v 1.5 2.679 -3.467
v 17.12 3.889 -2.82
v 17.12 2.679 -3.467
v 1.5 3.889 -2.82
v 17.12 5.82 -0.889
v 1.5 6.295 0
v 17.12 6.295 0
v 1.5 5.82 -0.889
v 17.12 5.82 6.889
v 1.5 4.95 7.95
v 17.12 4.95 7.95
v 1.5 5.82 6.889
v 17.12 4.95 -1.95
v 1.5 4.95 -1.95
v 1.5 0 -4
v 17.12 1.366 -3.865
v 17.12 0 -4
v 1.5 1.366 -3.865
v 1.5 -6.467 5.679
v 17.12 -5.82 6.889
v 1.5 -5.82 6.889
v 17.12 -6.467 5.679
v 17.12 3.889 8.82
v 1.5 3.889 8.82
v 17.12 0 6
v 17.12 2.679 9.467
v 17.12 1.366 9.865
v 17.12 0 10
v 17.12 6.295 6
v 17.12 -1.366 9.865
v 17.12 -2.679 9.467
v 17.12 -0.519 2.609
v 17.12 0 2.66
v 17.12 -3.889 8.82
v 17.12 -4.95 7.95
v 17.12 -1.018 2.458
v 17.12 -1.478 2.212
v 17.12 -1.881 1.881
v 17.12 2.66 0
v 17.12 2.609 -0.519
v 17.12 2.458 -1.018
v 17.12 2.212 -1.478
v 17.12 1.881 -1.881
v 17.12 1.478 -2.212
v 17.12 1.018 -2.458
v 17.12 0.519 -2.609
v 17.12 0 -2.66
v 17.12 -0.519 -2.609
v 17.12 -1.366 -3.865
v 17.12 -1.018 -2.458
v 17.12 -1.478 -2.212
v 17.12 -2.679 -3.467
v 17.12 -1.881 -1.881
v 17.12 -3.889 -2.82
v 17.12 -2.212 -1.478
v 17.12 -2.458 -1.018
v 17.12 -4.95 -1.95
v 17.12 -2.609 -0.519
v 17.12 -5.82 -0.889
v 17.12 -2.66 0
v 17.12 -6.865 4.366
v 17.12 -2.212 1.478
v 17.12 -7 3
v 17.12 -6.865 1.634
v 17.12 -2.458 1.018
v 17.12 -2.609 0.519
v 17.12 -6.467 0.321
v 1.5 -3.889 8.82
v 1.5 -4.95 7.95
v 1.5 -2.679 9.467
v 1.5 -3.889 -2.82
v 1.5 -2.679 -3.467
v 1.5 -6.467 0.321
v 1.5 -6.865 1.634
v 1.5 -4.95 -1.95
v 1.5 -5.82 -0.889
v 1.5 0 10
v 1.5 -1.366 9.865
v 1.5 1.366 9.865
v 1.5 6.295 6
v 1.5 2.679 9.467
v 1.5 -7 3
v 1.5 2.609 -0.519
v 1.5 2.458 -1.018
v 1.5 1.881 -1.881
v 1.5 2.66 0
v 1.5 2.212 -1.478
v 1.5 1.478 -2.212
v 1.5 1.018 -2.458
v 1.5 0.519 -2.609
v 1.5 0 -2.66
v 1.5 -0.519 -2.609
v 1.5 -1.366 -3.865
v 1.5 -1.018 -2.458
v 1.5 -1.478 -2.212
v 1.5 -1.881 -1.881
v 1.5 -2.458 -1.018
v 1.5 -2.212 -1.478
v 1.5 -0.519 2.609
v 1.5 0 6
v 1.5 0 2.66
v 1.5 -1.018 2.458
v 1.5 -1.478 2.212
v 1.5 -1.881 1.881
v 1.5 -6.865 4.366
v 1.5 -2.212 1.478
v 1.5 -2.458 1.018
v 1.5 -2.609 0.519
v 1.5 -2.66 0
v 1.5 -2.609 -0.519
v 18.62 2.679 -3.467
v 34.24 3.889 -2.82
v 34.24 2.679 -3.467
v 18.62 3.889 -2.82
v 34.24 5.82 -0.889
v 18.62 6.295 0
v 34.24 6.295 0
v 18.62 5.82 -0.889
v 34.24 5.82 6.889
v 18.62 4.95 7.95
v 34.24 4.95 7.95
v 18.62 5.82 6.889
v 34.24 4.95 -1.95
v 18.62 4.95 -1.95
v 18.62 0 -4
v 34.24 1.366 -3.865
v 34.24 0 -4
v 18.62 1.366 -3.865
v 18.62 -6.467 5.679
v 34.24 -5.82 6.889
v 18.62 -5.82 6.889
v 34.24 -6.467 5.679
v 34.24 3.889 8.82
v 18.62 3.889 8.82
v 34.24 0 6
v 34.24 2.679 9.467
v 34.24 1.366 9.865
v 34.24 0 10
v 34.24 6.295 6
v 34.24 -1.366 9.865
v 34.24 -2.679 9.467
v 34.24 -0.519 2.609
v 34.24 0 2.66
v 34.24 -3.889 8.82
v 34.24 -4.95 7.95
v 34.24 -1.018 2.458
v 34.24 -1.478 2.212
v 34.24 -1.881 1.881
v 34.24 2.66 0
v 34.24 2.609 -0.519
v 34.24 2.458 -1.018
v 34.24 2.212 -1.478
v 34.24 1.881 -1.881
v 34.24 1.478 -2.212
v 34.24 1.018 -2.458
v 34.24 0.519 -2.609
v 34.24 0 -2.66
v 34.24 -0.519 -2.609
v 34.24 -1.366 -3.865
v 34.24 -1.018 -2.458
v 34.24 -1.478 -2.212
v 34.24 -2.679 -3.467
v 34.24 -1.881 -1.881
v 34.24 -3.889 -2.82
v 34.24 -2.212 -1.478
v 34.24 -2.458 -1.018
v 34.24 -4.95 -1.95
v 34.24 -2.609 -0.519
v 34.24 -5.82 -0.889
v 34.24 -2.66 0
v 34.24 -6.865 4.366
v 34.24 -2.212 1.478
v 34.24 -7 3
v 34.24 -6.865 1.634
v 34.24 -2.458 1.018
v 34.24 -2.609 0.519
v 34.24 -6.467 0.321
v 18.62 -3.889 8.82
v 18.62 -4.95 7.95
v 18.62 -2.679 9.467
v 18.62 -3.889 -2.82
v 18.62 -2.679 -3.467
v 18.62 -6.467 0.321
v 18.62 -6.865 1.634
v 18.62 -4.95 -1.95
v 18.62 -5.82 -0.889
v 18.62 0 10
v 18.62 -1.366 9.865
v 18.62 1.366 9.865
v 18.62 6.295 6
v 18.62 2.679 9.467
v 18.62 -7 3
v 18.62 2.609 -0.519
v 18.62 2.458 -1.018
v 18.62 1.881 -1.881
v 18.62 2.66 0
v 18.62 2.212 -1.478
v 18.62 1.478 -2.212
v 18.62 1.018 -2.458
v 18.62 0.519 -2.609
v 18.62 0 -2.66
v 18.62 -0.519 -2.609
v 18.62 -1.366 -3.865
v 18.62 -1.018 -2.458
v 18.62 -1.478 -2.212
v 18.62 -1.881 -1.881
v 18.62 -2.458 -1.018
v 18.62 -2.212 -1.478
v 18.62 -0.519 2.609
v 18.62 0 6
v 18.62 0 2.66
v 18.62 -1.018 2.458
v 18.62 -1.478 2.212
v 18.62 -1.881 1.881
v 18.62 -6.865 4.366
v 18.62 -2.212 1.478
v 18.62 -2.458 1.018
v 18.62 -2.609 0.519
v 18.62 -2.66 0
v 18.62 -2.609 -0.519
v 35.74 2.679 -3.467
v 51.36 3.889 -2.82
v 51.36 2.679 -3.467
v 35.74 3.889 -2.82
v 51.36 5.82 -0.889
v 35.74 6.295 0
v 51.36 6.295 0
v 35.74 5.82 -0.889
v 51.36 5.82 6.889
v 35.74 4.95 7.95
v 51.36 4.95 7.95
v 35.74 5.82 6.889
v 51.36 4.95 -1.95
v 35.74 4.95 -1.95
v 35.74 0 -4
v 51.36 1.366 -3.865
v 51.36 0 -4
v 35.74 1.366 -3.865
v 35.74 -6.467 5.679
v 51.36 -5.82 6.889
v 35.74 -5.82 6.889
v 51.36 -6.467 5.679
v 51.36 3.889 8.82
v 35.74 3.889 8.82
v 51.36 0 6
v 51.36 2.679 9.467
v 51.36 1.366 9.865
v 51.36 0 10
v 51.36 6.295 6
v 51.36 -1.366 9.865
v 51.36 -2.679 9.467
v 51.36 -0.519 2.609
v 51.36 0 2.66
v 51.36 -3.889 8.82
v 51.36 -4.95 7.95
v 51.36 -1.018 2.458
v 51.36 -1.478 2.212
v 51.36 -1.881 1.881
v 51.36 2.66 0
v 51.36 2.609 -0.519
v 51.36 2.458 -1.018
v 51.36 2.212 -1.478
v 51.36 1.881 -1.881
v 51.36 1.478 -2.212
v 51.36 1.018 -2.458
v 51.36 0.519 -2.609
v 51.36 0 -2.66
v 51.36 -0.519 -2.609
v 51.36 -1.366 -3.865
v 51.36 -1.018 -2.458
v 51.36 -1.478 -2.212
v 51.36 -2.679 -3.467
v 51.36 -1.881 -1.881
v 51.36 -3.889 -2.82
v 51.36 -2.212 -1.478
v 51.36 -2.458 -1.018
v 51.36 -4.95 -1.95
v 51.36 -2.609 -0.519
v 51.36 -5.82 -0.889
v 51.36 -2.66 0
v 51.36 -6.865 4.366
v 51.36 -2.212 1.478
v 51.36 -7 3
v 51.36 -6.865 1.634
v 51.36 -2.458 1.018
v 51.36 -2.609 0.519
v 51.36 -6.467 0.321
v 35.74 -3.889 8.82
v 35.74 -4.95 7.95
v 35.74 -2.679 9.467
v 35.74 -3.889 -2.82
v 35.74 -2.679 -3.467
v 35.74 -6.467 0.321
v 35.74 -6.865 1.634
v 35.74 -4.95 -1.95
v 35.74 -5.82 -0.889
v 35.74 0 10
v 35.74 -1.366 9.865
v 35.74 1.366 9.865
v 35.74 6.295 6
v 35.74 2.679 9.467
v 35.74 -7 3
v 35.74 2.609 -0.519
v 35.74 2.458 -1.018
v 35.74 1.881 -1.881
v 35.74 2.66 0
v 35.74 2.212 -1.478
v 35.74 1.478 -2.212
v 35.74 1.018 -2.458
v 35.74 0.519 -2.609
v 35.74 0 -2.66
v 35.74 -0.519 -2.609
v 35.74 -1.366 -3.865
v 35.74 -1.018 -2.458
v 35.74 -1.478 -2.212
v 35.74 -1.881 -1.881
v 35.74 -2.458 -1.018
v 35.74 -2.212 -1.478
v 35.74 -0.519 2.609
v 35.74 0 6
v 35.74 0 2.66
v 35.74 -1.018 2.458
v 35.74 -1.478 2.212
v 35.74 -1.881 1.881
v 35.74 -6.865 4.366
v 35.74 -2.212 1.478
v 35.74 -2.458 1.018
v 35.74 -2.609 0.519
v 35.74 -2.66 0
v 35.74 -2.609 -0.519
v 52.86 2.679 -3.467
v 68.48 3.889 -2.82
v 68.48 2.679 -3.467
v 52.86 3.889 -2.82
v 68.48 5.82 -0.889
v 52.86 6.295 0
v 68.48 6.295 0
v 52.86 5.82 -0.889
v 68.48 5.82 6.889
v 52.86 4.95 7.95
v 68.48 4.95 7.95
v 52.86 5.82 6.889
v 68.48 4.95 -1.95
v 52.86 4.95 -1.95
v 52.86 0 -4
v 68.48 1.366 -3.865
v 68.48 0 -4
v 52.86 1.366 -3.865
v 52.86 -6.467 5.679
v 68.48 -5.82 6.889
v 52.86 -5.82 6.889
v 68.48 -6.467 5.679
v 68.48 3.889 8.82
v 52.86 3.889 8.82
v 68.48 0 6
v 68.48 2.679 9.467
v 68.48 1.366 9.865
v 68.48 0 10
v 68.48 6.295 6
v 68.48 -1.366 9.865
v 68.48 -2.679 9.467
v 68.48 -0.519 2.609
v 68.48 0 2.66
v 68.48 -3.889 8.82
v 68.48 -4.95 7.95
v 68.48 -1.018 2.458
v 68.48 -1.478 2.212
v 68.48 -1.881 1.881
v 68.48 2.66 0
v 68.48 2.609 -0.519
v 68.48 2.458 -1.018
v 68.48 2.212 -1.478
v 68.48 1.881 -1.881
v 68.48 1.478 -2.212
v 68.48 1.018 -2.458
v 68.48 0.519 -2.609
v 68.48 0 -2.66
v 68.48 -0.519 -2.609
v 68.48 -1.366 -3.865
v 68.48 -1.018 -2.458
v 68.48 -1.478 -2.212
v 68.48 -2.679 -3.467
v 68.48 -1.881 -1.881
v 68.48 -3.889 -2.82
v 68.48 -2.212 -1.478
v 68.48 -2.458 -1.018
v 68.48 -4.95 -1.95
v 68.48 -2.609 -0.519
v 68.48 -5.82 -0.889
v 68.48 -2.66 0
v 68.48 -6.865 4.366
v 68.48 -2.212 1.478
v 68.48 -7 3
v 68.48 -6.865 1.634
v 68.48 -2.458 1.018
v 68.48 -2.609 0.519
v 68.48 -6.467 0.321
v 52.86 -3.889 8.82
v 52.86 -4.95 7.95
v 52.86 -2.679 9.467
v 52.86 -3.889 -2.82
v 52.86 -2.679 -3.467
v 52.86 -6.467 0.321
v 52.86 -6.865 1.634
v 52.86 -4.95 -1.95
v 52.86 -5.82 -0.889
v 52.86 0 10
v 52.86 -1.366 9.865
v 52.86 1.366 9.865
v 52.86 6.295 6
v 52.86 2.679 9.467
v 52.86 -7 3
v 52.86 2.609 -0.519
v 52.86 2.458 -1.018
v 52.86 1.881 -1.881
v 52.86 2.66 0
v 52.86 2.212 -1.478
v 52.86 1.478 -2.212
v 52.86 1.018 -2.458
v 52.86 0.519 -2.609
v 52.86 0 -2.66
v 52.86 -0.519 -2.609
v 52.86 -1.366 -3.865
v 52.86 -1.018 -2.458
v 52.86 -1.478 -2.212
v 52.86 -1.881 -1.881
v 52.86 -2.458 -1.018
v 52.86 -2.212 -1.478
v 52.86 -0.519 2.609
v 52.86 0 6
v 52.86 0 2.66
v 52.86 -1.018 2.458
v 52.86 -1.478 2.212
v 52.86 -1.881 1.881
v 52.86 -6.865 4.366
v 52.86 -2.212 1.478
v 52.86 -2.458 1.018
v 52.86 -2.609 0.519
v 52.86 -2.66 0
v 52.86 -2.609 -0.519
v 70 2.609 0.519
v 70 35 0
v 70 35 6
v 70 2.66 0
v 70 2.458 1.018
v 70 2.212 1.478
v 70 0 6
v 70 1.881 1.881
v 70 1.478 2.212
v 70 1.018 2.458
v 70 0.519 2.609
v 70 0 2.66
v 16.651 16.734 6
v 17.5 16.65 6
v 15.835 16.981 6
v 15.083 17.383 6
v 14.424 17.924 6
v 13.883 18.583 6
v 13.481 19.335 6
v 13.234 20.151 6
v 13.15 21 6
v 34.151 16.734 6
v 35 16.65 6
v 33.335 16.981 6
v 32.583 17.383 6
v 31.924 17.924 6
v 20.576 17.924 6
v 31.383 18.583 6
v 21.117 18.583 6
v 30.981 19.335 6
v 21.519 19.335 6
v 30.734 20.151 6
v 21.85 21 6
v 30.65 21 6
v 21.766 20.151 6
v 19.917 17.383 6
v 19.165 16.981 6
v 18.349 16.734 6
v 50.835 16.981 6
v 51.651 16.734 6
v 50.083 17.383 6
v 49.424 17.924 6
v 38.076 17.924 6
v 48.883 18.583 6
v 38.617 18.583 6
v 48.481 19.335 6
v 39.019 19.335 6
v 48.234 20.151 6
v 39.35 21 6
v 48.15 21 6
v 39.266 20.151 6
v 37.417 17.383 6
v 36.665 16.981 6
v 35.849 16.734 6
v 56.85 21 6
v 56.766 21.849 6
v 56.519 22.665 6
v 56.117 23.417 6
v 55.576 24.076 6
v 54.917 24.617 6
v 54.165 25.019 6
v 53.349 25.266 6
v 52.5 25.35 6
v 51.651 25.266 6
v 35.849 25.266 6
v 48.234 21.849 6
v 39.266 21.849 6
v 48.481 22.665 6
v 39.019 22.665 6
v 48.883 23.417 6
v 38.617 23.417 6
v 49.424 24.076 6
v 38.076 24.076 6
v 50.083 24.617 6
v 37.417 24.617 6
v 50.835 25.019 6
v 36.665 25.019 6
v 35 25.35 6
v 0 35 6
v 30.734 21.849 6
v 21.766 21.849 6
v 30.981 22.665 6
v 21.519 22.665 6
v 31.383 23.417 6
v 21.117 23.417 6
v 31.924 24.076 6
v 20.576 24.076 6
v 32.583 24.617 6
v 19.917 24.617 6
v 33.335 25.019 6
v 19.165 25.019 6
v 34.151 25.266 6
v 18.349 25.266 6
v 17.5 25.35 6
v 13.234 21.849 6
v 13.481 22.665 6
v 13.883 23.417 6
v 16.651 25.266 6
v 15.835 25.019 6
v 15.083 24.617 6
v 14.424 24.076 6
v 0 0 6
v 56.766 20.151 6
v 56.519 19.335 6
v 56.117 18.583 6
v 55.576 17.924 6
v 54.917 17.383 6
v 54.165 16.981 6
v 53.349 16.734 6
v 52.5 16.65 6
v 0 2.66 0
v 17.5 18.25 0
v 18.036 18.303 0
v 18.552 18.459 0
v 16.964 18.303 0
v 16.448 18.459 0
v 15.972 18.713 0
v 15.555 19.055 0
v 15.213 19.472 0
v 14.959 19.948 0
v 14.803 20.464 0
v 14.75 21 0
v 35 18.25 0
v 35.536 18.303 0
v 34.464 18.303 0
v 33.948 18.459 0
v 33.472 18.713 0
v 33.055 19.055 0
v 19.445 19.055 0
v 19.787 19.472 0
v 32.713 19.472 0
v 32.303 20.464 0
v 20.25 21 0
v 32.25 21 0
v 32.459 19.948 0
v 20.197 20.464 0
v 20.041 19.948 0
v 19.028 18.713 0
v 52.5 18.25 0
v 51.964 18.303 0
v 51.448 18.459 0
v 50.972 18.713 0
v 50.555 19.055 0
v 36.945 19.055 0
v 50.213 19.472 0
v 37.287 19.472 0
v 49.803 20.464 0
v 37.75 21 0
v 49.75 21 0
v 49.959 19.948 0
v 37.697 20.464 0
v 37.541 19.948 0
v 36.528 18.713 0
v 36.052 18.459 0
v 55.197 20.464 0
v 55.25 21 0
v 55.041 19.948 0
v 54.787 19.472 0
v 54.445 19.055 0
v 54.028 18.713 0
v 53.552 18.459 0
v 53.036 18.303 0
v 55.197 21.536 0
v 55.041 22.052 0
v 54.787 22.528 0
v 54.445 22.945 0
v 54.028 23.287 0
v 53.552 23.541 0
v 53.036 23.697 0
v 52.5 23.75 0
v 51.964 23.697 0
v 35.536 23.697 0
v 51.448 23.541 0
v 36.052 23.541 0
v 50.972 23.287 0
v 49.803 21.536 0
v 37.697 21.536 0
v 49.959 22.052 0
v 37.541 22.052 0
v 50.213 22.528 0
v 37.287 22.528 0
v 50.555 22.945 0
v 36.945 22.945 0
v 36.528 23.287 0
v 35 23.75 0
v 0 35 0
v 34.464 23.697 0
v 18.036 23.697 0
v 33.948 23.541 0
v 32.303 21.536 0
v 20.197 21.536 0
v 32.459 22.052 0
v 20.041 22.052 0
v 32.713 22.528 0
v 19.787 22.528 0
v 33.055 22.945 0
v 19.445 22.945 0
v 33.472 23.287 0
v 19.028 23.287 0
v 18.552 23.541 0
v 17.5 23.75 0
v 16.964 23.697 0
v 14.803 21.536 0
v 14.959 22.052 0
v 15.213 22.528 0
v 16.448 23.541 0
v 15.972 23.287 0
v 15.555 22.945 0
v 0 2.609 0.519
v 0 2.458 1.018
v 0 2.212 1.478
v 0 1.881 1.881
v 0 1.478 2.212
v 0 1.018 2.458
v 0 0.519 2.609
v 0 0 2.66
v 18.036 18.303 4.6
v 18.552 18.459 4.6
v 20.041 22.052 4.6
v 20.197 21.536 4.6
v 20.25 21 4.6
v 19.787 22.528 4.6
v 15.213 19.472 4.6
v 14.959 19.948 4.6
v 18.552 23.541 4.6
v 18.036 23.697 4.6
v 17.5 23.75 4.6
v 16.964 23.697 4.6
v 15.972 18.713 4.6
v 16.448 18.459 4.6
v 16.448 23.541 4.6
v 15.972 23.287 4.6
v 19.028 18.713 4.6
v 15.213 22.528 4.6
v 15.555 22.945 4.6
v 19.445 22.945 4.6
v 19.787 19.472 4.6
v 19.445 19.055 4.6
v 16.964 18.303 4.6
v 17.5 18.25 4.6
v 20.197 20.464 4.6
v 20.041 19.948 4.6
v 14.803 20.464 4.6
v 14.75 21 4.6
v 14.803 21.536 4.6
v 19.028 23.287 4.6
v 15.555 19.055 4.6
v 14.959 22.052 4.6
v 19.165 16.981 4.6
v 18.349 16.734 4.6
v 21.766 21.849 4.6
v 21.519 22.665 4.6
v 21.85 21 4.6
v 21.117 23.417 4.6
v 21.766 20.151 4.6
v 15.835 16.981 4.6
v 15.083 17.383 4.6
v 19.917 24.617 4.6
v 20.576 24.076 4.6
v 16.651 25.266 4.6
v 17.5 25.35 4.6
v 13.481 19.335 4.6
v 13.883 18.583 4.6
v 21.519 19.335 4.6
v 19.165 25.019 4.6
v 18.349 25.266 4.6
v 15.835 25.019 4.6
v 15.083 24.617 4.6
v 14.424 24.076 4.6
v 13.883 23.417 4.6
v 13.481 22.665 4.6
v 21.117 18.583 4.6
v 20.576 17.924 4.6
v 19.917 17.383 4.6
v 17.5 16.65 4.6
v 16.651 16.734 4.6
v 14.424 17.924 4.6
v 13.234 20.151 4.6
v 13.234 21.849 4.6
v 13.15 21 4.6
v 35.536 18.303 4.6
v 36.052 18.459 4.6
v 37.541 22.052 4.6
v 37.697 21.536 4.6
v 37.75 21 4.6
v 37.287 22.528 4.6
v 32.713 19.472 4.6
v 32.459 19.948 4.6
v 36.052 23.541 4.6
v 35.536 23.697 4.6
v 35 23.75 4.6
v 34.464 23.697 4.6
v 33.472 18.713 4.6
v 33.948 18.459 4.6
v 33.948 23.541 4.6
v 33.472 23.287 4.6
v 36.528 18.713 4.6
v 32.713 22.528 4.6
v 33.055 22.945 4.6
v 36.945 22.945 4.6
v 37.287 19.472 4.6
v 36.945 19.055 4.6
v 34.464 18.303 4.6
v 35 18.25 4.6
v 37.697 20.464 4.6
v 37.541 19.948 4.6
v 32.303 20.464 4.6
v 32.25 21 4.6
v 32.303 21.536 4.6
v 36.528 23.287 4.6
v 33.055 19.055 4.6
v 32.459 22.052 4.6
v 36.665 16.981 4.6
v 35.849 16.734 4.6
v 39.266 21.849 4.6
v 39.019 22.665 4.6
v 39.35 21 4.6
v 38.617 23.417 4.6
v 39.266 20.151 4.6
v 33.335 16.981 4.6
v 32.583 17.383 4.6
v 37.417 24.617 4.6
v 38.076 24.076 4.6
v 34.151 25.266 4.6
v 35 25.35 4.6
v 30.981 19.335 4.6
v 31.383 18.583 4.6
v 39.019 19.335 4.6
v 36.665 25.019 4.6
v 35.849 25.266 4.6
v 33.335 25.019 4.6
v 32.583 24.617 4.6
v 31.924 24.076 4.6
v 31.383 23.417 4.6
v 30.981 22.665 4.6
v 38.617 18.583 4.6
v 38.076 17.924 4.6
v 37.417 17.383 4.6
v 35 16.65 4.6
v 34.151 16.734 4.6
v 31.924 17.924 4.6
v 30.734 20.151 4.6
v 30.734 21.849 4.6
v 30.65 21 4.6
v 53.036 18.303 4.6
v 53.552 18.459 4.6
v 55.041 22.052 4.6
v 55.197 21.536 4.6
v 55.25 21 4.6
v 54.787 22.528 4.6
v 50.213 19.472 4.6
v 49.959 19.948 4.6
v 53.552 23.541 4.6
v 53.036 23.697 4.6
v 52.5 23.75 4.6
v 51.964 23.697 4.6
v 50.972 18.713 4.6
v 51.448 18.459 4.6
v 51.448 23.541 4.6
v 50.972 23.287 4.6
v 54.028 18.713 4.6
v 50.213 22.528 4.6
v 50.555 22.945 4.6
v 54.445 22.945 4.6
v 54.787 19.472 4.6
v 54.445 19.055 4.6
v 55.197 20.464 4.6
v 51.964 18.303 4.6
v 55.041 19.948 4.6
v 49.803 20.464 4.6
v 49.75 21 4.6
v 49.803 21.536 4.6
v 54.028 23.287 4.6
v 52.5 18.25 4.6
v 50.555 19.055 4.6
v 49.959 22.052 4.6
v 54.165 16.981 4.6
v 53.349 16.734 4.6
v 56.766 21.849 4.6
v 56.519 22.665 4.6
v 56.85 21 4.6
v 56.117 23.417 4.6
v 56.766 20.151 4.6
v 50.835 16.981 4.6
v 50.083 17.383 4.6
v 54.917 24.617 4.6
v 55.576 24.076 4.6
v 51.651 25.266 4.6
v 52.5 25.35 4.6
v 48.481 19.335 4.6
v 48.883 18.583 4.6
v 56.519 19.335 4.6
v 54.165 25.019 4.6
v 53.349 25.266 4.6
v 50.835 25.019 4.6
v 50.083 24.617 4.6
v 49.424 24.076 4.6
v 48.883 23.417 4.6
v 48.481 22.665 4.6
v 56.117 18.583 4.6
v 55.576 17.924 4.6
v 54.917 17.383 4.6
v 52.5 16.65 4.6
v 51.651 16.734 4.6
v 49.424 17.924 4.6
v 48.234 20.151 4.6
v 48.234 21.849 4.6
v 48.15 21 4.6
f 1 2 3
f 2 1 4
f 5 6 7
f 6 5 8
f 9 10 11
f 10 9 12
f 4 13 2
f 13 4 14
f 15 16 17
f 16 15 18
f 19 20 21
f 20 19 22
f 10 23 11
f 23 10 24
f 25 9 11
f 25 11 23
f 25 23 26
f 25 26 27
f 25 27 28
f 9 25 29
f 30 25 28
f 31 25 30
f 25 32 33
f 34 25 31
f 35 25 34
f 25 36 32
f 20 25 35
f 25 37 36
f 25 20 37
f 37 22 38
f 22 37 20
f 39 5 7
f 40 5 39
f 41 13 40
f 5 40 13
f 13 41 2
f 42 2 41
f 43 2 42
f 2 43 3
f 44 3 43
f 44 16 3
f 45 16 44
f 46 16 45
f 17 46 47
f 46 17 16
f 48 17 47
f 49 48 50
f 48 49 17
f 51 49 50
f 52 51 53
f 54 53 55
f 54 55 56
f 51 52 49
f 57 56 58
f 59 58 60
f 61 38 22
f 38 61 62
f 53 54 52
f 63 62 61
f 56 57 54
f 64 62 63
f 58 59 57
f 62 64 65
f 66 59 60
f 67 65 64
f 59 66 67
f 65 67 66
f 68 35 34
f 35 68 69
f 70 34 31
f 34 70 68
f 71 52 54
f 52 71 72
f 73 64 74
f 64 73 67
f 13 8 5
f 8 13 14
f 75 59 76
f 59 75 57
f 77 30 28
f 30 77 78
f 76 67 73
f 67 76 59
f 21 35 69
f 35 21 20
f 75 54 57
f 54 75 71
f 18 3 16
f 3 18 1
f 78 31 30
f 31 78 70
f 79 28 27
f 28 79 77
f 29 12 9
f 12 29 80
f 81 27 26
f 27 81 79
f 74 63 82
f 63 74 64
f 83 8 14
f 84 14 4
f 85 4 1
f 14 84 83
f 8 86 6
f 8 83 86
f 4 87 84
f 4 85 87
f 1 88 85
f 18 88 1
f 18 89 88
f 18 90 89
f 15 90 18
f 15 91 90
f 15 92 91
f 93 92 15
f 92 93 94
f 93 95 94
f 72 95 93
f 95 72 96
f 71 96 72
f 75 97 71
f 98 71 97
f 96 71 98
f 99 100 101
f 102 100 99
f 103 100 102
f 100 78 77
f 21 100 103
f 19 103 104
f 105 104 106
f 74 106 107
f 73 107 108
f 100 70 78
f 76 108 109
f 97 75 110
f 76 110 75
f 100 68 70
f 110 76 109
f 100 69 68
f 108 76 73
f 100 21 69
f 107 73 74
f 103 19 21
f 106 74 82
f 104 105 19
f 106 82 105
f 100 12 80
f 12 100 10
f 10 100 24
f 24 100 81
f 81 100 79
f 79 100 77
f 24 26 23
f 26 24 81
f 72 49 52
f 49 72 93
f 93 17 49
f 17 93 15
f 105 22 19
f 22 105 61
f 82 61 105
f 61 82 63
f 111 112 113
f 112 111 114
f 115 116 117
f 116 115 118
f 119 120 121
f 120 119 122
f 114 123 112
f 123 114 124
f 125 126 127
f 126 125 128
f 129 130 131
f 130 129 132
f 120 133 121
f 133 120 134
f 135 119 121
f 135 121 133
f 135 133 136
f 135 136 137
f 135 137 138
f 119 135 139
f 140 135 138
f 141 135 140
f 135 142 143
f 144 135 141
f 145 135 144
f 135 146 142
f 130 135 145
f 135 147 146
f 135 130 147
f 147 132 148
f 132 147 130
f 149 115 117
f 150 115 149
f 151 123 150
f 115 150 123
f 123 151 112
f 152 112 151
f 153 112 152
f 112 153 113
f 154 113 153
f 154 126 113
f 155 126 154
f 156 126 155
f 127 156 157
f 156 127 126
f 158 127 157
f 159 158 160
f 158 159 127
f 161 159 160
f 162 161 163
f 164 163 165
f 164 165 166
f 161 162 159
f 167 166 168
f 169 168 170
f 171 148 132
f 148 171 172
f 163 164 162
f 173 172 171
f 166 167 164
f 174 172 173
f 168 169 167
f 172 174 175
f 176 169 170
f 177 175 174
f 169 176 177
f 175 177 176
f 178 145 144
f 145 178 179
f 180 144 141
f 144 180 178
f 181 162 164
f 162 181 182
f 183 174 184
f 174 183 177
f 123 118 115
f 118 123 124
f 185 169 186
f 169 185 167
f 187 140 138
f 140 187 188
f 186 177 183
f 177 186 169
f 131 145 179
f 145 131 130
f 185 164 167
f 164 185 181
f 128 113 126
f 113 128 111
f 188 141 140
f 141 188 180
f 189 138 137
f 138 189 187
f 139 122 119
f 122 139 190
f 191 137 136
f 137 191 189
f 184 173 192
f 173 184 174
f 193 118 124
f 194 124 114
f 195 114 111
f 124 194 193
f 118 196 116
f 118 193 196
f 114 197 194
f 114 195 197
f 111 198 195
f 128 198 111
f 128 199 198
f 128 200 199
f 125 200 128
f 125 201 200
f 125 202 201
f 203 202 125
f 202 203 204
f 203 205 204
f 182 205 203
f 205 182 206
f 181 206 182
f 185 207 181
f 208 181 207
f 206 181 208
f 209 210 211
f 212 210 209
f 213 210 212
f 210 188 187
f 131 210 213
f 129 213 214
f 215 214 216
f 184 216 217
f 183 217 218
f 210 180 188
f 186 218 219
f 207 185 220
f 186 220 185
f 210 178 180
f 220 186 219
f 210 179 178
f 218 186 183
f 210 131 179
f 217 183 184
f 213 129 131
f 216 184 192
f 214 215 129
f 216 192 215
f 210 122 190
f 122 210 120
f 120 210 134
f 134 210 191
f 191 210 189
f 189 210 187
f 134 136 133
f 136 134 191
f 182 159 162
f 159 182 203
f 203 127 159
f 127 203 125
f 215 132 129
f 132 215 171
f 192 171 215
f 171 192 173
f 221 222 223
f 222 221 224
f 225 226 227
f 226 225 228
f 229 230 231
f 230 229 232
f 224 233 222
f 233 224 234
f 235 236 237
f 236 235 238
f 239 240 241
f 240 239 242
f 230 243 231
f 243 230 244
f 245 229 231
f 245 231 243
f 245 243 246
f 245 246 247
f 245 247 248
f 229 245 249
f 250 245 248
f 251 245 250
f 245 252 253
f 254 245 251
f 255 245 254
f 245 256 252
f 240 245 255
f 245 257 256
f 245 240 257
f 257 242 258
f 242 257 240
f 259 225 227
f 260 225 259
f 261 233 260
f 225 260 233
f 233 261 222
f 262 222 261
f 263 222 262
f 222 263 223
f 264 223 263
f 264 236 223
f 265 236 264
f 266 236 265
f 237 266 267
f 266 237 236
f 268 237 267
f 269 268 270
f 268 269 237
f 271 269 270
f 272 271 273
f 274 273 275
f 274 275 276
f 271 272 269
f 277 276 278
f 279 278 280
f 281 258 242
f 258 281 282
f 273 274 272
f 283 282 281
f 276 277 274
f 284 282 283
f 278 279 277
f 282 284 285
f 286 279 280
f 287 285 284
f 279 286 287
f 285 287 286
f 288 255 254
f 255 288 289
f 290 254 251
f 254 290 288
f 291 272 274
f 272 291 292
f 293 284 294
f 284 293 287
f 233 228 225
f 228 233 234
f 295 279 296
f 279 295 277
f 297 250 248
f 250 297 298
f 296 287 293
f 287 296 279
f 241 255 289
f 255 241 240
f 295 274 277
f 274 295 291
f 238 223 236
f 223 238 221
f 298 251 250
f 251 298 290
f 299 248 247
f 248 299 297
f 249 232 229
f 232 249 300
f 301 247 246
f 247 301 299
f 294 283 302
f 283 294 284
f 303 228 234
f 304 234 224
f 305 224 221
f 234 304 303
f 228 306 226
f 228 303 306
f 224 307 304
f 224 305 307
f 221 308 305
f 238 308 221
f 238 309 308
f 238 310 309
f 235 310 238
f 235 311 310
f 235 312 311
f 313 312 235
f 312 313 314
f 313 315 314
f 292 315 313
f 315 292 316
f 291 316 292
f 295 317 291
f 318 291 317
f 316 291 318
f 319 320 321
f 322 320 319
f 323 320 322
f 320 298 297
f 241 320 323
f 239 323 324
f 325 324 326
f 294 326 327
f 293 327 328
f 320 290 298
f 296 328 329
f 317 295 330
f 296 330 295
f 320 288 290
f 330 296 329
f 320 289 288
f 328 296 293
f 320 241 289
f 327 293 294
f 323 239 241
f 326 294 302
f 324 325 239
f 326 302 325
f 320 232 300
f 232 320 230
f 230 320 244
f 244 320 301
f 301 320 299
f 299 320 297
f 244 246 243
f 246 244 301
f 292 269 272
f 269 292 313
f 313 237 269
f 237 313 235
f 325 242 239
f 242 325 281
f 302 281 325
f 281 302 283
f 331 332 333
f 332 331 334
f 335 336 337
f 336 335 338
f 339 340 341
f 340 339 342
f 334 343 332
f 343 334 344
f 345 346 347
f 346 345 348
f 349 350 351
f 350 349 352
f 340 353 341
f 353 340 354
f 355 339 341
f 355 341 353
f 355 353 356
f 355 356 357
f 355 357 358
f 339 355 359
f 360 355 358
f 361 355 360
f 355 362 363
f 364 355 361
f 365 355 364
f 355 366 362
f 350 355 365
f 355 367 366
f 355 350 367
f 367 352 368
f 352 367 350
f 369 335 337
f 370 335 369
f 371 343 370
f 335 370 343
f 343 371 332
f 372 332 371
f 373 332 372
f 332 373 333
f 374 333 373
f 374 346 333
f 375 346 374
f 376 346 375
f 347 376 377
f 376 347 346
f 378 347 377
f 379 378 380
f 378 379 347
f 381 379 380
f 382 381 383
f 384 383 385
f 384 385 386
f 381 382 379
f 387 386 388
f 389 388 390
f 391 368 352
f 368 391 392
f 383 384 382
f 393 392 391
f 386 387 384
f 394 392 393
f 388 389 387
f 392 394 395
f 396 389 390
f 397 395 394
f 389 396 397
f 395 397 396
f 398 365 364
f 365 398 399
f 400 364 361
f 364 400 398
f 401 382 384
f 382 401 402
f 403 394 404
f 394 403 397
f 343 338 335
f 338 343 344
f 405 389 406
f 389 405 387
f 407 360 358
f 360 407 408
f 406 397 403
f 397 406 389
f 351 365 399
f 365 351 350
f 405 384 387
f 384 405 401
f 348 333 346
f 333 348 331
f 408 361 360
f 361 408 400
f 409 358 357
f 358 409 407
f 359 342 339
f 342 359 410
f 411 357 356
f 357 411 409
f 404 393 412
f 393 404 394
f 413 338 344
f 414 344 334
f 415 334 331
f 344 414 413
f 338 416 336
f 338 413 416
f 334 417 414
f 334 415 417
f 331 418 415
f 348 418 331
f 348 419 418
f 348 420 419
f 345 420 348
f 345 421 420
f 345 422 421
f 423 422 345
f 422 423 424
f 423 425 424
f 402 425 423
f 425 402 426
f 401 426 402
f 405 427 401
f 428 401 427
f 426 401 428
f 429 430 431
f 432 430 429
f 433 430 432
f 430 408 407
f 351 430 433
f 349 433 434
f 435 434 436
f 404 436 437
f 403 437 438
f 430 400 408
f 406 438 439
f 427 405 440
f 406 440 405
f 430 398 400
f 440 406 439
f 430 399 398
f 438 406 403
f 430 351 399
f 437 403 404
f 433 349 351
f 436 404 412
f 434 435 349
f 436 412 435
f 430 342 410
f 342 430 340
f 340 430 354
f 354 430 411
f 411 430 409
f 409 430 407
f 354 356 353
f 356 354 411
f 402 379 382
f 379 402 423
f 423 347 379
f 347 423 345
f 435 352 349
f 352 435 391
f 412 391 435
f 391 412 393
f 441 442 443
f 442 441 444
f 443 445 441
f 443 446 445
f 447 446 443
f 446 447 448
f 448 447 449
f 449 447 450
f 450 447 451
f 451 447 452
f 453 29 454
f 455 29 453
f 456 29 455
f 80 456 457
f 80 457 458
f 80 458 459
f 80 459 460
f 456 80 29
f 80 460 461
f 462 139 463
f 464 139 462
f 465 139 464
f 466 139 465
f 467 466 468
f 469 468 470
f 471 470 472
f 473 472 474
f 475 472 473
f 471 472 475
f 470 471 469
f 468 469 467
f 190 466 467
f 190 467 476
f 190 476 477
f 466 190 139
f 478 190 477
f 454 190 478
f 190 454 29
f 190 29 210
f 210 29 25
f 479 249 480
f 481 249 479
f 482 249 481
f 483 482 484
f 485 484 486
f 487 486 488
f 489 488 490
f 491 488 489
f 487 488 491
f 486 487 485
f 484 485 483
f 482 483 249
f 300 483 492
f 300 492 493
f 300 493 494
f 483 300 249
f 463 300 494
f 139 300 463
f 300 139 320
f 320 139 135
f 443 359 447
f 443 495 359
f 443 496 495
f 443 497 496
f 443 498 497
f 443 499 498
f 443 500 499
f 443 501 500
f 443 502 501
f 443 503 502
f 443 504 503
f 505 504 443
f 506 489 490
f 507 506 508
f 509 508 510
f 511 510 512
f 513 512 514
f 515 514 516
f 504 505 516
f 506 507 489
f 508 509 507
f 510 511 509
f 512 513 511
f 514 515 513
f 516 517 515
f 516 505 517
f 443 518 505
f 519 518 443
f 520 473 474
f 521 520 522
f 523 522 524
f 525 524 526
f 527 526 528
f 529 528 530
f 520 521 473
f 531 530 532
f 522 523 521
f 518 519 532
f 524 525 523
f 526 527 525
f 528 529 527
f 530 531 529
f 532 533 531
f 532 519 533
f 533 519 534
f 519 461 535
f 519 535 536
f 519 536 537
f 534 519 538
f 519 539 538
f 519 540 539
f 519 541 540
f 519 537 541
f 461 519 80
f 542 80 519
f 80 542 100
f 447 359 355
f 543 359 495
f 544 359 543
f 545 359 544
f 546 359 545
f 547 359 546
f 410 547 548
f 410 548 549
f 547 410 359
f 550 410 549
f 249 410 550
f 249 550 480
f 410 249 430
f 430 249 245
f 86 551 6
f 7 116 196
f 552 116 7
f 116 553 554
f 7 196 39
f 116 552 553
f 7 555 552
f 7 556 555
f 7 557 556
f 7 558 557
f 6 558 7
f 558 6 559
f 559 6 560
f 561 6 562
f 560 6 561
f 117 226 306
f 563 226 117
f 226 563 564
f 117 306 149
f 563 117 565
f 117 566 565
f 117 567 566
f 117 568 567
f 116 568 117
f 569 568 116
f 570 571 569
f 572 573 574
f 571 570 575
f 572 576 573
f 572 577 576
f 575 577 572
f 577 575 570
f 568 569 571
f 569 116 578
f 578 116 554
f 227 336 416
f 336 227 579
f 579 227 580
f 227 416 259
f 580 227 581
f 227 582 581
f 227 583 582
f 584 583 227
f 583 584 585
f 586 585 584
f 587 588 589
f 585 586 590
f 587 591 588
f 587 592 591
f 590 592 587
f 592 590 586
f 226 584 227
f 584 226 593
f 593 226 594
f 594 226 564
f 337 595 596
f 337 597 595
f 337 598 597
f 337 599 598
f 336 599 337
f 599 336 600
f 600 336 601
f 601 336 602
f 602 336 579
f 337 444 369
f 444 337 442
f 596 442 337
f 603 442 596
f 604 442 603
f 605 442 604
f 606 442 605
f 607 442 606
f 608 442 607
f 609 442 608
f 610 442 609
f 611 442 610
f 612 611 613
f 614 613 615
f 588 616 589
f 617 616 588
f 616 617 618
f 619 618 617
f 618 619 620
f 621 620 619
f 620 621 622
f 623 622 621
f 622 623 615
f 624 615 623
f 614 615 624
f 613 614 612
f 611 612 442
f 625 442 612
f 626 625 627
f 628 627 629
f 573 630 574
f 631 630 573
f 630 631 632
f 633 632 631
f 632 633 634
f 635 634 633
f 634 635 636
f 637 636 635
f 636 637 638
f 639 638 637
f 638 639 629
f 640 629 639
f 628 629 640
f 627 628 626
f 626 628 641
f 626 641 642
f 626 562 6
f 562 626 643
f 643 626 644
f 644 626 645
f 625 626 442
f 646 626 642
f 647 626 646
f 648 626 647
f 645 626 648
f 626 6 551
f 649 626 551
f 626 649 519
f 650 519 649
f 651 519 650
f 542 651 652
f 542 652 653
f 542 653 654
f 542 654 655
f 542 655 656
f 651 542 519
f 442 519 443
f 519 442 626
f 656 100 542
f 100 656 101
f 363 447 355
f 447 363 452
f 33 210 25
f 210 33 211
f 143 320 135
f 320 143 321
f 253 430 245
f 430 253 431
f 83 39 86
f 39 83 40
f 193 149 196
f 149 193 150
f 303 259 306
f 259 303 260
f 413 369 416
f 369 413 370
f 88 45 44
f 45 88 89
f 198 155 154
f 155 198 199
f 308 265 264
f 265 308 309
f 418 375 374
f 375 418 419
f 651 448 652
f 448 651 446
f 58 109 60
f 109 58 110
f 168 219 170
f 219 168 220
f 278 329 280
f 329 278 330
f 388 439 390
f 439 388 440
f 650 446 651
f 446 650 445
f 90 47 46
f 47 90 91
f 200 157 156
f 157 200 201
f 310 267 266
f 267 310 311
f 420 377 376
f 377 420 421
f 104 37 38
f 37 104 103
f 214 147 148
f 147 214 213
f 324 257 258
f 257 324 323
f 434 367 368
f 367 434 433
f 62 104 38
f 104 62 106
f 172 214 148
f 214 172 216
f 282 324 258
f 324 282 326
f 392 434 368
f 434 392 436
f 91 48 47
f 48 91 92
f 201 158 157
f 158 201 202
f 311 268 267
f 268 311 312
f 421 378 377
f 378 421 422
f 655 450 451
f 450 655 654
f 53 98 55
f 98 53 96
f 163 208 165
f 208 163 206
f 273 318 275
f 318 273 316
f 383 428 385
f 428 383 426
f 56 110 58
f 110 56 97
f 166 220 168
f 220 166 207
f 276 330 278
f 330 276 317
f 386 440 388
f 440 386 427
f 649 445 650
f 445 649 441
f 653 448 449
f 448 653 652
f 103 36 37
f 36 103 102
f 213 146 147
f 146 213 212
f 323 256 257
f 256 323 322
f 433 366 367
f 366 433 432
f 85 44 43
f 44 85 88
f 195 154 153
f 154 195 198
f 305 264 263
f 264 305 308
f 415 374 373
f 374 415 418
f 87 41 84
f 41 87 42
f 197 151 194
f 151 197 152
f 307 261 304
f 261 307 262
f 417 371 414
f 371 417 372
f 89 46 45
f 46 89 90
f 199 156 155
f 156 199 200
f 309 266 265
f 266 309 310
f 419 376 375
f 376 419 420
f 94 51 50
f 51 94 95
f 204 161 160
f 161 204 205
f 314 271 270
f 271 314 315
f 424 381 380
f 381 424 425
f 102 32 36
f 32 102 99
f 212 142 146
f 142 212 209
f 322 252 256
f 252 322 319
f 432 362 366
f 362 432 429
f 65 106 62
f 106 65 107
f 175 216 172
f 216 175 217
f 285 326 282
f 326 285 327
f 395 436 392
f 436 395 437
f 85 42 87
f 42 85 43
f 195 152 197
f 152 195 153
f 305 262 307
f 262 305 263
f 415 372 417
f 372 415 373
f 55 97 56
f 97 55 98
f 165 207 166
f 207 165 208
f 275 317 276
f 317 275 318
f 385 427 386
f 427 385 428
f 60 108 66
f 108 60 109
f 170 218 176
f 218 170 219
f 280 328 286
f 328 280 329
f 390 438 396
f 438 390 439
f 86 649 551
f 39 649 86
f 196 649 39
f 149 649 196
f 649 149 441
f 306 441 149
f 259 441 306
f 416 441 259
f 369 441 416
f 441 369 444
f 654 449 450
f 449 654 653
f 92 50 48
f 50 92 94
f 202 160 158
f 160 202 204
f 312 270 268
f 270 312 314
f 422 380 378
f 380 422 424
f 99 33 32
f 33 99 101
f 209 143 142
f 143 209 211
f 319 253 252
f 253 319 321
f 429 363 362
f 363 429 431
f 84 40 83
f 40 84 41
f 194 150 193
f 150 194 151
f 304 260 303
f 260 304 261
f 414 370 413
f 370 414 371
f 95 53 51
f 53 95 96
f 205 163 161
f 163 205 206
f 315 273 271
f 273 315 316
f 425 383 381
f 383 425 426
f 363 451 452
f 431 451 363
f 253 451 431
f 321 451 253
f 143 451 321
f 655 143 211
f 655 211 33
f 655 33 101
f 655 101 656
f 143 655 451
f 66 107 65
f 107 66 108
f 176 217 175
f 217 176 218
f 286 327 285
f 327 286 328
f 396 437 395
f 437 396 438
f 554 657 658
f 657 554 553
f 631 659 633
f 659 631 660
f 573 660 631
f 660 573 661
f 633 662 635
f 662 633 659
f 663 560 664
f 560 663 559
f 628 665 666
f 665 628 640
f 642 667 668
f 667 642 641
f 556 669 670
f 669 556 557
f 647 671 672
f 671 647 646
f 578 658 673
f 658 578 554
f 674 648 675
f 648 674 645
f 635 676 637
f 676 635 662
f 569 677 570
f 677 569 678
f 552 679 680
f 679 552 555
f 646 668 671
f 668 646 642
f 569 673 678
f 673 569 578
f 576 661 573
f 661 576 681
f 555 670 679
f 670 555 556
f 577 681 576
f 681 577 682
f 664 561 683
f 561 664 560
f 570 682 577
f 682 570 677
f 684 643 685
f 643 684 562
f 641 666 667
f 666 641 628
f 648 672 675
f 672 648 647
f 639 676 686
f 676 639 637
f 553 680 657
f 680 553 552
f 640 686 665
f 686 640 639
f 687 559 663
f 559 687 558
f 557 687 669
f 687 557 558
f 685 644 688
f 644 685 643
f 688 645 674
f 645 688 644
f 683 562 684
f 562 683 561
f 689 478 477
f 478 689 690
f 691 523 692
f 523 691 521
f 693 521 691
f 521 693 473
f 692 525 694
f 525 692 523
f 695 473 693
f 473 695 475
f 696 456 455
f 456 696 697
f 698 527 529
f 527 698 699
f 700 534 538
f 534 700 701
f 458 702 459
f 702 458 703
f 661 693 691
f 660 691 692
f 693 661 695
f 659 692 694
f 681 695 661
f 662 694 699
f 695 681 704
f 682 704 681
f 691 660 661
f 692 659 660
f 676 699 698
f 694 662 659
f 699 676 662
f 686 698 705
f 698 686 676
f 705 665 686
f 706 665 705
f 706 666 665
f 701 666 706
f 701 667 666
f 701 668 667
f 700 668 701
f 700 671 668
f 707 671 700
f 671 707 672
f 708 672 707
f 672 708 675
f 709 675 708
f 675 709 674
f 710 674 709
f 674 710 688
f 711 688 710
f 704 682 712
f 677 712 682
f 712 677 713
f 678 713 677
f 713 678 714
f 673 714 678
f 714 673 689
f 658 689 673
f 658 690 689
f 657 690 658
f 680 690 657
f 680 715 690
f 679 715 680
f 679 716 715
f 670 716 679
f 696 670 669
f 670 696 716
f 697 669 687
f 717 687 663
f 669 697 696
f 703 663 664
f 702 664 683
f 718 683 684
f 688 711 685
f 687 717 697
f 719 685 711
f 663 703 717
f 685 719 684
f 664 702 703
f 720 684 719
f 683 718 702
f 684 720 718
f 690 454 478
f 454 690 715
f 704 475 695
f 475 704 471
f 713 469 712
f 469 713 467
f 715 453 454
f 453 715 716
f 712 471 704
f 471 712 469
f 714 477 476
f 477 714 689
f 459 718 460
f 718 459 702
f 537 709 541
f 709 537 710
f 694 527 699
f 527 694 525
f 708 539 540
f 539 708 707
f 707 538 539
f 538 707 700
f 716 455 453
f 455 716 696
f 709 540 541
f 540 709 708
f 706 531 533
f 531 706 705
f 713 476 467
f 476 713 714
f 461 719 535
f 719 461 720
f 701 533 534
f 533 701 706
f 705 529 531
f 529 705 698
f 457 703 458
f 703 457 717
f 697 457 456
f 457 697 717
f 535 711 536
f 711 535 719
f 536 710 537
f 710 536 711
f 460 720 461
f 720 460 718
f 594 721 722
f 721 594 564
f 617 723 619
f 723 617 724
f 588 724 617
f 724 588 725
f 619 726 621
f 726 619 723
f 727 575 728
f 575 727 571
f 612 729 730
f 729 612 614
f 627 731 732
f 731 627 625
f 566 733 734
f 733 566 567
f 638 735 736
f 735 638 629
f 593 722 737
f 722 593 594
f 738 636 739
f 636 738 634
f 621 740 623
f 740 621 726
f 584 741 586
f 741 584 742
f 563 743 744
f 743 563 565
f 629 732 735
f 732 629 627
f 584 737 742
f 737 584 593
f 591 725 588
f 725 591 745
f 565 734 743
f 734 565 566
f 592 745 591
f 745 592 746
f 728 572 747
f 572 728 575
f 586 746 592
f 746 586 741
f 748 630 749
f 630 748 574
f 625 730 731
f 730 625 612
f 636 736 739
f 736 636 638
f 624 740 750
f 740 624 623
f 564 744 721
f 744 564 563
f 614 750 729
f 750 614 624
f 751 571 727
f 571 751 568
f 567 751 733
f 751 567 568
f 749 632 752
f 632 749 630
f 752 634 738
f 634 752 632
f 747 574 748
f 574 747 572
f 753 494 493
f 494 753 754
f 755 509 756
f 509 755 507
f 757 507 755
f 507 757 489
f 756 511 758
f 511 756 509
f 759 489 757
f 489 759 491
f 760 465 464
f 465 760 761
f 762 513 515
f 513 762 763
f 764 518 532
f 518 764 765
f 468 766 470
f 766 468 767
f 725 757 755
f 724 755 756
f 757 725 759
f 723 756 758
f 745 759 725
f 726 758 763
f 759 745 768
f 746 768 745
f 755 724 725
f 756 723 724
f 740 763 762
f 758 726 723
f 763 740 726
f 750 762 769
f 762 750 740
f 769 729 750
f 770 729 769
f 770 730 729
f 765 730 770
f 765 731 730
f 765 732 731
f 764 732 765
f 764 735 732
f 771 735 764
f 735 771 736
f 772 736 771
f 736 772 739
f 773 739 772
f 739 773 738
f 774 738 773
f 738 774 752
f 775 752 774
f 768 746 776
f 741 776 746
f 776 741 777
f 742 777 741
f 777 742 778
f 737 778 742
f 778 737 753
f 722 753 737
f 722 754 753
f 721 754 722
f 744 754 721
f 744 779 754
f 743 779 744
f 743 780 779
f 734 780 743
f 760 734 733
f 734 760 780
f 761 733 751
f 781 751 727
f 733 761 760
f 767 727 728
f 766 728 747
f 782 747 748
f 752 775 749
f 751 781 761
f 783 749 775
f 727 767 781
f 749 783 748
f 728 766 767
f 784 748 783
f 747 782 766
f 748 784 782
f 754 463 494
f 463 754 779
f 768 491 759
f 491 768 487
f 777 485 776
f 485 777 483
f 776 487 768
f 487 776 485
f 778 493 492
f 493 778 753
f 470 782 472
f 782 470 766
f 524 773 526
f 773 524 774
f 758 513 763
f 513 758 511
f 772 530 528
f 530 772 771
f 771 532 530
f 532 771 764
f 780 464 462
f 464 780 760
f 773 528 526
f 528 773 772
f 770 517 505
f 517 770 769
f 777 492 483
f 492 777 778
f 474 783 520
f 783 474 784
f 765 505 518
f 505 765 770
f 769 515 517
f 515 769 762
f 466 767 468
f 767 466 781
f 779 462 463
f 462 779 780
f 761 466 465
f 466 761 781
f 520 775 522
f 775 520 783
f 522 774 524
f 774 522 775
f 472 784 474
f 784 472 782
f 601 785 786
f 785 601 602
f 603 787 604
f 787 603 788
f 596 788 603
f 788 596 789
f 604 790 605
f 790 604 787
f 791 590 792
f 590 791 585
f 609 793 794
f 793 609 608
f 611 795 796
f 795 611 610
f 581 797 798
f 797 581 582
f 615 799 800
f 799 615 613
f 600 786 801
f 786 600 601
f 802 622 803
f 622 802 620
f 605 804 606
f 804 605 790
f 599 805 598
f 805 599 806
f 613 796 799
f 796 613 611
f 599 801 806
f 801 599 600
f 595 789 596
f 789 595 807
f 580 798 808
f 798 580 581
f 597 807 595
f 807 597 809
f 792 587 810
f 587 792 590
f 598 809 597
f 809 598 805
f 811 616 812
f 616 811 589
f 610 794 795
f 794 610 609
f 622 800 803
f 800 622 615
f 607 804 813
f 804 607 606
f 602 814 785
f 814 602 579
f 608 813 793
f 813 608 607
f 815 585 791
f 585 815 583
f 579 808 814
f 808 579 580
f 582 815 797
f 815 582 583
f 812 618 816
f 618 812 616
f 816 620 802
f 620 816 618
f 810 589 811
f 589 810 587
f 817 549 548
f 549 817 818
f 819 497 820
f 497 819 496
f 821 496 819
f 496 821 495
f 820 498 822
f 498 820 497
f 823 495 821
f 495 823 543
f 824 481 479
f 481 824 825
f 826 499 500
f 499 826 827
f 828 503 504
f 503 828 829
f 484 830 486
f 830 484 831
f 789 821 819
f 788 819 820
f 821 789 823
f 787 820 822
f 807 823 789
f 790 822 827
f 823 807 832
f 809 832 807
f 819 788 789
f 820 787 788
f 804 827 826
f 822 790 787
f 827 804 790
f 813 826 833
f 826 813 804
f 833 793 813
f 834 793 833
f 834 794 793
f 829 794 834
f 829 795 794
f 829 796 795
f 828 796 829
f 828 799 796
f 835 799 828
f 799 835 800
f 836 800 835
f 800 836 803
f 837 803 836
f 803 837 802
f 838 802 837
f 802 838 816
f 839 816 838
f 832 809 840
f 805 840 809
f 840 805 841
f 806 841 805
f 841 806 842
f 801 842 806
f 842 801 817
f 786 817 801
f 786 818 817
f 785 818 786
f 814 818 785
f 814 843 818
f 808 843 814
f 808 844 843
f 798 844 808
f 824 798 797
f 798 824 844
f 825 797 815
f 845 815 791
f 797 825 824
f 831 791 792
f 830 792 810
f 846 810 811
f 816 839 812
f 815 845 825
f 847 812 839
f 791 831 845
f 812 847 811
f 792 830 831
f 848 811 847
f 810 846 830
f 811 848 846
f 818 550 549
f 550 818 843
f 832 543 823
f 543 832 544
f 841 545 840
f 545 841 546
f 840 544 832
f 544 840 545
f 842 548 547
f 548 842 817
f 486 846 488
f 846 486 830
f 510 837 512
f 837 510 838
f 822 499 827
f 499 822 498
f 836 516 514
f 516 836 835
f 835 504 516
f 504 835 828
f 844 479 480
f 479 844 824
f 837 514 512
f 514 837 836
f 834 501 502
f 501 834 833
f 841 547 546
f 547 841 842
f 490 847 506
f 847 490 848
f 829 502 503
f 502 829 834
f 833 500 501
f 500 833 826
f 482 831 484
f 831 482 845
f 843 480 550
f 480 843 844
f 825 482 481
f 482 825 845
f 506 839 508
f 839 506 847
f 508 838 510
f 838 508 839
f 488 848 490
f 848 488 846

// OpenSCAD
$fn = 32;

// ----------------------------------------------------------------------
// Hinge leaf: 70 x 42 x 14 mm
// ----------------------------------------------------------------------

// --- parameters (mm) ---
plate_len = 70;           // leaf length, X
plate_w = 35;             // leaf width, Y
plate_t = 6;              // leaf thickness
barrel_d = 14;            // knuckle diameter
barrel_w = 15.62;         // knuckle width
knuckle_n = 4;            // number of knuckles
pin_d = 5.32;             // pin bore
gap = 1.5;                // gap between the knuckles
screw_d = 5.5;            // screw clearance
cs_d = 8.7;               // countersink diameter
cs_h = 1.4;               // countersink depth

module leaf() {
  cube([plate_len, plate_w, plate_t]);
}

module knuckles() {
  /* barrels sit on the leaf edge, the pin axis at half the leaf thickness */
  for (i = [0 : knuckle_n - 1])
    translate([gap + i * (barrel_w + gap), 0, plate_t * 0.5])
      rotate([0, 90, 0]) cylinder(h = barrel_w, d = barrel_d);
}

difference() {
  union() {
    leaf();
    knuckles();
  }
  rotate([0, 90, 0]) translate([0, 0, -1])
    cylinder(h = plate_len + 2, d = pin_d);
  translate([17.5, plate_w * 0.6, -1]) cylinder(h = plate_t + 2, d = screw_d);
  translate([17.5, plate_w * 0.6, plate_t - cs_h]) cylinder(h = cs_h + 0.5, d = cs_d);
  translate([35, plate_w * 0.6, -1]) cylinder(h = plate_t + 2, d = screw_d);
  translate([35, plate_w * 0.6, plate_t - cs_h]) cylinder(h = cs_h + 0.5, d = cs_d);
  translate([52.5, plate_w * 0.6, -1]) cylinder(h = plate_t + 2, d = screw_d);
  translate([52.5, plate_w * 0.6, plate_t - cs_h]) cylinder(h = cs_h + 0.5, d = cs_d);
}
